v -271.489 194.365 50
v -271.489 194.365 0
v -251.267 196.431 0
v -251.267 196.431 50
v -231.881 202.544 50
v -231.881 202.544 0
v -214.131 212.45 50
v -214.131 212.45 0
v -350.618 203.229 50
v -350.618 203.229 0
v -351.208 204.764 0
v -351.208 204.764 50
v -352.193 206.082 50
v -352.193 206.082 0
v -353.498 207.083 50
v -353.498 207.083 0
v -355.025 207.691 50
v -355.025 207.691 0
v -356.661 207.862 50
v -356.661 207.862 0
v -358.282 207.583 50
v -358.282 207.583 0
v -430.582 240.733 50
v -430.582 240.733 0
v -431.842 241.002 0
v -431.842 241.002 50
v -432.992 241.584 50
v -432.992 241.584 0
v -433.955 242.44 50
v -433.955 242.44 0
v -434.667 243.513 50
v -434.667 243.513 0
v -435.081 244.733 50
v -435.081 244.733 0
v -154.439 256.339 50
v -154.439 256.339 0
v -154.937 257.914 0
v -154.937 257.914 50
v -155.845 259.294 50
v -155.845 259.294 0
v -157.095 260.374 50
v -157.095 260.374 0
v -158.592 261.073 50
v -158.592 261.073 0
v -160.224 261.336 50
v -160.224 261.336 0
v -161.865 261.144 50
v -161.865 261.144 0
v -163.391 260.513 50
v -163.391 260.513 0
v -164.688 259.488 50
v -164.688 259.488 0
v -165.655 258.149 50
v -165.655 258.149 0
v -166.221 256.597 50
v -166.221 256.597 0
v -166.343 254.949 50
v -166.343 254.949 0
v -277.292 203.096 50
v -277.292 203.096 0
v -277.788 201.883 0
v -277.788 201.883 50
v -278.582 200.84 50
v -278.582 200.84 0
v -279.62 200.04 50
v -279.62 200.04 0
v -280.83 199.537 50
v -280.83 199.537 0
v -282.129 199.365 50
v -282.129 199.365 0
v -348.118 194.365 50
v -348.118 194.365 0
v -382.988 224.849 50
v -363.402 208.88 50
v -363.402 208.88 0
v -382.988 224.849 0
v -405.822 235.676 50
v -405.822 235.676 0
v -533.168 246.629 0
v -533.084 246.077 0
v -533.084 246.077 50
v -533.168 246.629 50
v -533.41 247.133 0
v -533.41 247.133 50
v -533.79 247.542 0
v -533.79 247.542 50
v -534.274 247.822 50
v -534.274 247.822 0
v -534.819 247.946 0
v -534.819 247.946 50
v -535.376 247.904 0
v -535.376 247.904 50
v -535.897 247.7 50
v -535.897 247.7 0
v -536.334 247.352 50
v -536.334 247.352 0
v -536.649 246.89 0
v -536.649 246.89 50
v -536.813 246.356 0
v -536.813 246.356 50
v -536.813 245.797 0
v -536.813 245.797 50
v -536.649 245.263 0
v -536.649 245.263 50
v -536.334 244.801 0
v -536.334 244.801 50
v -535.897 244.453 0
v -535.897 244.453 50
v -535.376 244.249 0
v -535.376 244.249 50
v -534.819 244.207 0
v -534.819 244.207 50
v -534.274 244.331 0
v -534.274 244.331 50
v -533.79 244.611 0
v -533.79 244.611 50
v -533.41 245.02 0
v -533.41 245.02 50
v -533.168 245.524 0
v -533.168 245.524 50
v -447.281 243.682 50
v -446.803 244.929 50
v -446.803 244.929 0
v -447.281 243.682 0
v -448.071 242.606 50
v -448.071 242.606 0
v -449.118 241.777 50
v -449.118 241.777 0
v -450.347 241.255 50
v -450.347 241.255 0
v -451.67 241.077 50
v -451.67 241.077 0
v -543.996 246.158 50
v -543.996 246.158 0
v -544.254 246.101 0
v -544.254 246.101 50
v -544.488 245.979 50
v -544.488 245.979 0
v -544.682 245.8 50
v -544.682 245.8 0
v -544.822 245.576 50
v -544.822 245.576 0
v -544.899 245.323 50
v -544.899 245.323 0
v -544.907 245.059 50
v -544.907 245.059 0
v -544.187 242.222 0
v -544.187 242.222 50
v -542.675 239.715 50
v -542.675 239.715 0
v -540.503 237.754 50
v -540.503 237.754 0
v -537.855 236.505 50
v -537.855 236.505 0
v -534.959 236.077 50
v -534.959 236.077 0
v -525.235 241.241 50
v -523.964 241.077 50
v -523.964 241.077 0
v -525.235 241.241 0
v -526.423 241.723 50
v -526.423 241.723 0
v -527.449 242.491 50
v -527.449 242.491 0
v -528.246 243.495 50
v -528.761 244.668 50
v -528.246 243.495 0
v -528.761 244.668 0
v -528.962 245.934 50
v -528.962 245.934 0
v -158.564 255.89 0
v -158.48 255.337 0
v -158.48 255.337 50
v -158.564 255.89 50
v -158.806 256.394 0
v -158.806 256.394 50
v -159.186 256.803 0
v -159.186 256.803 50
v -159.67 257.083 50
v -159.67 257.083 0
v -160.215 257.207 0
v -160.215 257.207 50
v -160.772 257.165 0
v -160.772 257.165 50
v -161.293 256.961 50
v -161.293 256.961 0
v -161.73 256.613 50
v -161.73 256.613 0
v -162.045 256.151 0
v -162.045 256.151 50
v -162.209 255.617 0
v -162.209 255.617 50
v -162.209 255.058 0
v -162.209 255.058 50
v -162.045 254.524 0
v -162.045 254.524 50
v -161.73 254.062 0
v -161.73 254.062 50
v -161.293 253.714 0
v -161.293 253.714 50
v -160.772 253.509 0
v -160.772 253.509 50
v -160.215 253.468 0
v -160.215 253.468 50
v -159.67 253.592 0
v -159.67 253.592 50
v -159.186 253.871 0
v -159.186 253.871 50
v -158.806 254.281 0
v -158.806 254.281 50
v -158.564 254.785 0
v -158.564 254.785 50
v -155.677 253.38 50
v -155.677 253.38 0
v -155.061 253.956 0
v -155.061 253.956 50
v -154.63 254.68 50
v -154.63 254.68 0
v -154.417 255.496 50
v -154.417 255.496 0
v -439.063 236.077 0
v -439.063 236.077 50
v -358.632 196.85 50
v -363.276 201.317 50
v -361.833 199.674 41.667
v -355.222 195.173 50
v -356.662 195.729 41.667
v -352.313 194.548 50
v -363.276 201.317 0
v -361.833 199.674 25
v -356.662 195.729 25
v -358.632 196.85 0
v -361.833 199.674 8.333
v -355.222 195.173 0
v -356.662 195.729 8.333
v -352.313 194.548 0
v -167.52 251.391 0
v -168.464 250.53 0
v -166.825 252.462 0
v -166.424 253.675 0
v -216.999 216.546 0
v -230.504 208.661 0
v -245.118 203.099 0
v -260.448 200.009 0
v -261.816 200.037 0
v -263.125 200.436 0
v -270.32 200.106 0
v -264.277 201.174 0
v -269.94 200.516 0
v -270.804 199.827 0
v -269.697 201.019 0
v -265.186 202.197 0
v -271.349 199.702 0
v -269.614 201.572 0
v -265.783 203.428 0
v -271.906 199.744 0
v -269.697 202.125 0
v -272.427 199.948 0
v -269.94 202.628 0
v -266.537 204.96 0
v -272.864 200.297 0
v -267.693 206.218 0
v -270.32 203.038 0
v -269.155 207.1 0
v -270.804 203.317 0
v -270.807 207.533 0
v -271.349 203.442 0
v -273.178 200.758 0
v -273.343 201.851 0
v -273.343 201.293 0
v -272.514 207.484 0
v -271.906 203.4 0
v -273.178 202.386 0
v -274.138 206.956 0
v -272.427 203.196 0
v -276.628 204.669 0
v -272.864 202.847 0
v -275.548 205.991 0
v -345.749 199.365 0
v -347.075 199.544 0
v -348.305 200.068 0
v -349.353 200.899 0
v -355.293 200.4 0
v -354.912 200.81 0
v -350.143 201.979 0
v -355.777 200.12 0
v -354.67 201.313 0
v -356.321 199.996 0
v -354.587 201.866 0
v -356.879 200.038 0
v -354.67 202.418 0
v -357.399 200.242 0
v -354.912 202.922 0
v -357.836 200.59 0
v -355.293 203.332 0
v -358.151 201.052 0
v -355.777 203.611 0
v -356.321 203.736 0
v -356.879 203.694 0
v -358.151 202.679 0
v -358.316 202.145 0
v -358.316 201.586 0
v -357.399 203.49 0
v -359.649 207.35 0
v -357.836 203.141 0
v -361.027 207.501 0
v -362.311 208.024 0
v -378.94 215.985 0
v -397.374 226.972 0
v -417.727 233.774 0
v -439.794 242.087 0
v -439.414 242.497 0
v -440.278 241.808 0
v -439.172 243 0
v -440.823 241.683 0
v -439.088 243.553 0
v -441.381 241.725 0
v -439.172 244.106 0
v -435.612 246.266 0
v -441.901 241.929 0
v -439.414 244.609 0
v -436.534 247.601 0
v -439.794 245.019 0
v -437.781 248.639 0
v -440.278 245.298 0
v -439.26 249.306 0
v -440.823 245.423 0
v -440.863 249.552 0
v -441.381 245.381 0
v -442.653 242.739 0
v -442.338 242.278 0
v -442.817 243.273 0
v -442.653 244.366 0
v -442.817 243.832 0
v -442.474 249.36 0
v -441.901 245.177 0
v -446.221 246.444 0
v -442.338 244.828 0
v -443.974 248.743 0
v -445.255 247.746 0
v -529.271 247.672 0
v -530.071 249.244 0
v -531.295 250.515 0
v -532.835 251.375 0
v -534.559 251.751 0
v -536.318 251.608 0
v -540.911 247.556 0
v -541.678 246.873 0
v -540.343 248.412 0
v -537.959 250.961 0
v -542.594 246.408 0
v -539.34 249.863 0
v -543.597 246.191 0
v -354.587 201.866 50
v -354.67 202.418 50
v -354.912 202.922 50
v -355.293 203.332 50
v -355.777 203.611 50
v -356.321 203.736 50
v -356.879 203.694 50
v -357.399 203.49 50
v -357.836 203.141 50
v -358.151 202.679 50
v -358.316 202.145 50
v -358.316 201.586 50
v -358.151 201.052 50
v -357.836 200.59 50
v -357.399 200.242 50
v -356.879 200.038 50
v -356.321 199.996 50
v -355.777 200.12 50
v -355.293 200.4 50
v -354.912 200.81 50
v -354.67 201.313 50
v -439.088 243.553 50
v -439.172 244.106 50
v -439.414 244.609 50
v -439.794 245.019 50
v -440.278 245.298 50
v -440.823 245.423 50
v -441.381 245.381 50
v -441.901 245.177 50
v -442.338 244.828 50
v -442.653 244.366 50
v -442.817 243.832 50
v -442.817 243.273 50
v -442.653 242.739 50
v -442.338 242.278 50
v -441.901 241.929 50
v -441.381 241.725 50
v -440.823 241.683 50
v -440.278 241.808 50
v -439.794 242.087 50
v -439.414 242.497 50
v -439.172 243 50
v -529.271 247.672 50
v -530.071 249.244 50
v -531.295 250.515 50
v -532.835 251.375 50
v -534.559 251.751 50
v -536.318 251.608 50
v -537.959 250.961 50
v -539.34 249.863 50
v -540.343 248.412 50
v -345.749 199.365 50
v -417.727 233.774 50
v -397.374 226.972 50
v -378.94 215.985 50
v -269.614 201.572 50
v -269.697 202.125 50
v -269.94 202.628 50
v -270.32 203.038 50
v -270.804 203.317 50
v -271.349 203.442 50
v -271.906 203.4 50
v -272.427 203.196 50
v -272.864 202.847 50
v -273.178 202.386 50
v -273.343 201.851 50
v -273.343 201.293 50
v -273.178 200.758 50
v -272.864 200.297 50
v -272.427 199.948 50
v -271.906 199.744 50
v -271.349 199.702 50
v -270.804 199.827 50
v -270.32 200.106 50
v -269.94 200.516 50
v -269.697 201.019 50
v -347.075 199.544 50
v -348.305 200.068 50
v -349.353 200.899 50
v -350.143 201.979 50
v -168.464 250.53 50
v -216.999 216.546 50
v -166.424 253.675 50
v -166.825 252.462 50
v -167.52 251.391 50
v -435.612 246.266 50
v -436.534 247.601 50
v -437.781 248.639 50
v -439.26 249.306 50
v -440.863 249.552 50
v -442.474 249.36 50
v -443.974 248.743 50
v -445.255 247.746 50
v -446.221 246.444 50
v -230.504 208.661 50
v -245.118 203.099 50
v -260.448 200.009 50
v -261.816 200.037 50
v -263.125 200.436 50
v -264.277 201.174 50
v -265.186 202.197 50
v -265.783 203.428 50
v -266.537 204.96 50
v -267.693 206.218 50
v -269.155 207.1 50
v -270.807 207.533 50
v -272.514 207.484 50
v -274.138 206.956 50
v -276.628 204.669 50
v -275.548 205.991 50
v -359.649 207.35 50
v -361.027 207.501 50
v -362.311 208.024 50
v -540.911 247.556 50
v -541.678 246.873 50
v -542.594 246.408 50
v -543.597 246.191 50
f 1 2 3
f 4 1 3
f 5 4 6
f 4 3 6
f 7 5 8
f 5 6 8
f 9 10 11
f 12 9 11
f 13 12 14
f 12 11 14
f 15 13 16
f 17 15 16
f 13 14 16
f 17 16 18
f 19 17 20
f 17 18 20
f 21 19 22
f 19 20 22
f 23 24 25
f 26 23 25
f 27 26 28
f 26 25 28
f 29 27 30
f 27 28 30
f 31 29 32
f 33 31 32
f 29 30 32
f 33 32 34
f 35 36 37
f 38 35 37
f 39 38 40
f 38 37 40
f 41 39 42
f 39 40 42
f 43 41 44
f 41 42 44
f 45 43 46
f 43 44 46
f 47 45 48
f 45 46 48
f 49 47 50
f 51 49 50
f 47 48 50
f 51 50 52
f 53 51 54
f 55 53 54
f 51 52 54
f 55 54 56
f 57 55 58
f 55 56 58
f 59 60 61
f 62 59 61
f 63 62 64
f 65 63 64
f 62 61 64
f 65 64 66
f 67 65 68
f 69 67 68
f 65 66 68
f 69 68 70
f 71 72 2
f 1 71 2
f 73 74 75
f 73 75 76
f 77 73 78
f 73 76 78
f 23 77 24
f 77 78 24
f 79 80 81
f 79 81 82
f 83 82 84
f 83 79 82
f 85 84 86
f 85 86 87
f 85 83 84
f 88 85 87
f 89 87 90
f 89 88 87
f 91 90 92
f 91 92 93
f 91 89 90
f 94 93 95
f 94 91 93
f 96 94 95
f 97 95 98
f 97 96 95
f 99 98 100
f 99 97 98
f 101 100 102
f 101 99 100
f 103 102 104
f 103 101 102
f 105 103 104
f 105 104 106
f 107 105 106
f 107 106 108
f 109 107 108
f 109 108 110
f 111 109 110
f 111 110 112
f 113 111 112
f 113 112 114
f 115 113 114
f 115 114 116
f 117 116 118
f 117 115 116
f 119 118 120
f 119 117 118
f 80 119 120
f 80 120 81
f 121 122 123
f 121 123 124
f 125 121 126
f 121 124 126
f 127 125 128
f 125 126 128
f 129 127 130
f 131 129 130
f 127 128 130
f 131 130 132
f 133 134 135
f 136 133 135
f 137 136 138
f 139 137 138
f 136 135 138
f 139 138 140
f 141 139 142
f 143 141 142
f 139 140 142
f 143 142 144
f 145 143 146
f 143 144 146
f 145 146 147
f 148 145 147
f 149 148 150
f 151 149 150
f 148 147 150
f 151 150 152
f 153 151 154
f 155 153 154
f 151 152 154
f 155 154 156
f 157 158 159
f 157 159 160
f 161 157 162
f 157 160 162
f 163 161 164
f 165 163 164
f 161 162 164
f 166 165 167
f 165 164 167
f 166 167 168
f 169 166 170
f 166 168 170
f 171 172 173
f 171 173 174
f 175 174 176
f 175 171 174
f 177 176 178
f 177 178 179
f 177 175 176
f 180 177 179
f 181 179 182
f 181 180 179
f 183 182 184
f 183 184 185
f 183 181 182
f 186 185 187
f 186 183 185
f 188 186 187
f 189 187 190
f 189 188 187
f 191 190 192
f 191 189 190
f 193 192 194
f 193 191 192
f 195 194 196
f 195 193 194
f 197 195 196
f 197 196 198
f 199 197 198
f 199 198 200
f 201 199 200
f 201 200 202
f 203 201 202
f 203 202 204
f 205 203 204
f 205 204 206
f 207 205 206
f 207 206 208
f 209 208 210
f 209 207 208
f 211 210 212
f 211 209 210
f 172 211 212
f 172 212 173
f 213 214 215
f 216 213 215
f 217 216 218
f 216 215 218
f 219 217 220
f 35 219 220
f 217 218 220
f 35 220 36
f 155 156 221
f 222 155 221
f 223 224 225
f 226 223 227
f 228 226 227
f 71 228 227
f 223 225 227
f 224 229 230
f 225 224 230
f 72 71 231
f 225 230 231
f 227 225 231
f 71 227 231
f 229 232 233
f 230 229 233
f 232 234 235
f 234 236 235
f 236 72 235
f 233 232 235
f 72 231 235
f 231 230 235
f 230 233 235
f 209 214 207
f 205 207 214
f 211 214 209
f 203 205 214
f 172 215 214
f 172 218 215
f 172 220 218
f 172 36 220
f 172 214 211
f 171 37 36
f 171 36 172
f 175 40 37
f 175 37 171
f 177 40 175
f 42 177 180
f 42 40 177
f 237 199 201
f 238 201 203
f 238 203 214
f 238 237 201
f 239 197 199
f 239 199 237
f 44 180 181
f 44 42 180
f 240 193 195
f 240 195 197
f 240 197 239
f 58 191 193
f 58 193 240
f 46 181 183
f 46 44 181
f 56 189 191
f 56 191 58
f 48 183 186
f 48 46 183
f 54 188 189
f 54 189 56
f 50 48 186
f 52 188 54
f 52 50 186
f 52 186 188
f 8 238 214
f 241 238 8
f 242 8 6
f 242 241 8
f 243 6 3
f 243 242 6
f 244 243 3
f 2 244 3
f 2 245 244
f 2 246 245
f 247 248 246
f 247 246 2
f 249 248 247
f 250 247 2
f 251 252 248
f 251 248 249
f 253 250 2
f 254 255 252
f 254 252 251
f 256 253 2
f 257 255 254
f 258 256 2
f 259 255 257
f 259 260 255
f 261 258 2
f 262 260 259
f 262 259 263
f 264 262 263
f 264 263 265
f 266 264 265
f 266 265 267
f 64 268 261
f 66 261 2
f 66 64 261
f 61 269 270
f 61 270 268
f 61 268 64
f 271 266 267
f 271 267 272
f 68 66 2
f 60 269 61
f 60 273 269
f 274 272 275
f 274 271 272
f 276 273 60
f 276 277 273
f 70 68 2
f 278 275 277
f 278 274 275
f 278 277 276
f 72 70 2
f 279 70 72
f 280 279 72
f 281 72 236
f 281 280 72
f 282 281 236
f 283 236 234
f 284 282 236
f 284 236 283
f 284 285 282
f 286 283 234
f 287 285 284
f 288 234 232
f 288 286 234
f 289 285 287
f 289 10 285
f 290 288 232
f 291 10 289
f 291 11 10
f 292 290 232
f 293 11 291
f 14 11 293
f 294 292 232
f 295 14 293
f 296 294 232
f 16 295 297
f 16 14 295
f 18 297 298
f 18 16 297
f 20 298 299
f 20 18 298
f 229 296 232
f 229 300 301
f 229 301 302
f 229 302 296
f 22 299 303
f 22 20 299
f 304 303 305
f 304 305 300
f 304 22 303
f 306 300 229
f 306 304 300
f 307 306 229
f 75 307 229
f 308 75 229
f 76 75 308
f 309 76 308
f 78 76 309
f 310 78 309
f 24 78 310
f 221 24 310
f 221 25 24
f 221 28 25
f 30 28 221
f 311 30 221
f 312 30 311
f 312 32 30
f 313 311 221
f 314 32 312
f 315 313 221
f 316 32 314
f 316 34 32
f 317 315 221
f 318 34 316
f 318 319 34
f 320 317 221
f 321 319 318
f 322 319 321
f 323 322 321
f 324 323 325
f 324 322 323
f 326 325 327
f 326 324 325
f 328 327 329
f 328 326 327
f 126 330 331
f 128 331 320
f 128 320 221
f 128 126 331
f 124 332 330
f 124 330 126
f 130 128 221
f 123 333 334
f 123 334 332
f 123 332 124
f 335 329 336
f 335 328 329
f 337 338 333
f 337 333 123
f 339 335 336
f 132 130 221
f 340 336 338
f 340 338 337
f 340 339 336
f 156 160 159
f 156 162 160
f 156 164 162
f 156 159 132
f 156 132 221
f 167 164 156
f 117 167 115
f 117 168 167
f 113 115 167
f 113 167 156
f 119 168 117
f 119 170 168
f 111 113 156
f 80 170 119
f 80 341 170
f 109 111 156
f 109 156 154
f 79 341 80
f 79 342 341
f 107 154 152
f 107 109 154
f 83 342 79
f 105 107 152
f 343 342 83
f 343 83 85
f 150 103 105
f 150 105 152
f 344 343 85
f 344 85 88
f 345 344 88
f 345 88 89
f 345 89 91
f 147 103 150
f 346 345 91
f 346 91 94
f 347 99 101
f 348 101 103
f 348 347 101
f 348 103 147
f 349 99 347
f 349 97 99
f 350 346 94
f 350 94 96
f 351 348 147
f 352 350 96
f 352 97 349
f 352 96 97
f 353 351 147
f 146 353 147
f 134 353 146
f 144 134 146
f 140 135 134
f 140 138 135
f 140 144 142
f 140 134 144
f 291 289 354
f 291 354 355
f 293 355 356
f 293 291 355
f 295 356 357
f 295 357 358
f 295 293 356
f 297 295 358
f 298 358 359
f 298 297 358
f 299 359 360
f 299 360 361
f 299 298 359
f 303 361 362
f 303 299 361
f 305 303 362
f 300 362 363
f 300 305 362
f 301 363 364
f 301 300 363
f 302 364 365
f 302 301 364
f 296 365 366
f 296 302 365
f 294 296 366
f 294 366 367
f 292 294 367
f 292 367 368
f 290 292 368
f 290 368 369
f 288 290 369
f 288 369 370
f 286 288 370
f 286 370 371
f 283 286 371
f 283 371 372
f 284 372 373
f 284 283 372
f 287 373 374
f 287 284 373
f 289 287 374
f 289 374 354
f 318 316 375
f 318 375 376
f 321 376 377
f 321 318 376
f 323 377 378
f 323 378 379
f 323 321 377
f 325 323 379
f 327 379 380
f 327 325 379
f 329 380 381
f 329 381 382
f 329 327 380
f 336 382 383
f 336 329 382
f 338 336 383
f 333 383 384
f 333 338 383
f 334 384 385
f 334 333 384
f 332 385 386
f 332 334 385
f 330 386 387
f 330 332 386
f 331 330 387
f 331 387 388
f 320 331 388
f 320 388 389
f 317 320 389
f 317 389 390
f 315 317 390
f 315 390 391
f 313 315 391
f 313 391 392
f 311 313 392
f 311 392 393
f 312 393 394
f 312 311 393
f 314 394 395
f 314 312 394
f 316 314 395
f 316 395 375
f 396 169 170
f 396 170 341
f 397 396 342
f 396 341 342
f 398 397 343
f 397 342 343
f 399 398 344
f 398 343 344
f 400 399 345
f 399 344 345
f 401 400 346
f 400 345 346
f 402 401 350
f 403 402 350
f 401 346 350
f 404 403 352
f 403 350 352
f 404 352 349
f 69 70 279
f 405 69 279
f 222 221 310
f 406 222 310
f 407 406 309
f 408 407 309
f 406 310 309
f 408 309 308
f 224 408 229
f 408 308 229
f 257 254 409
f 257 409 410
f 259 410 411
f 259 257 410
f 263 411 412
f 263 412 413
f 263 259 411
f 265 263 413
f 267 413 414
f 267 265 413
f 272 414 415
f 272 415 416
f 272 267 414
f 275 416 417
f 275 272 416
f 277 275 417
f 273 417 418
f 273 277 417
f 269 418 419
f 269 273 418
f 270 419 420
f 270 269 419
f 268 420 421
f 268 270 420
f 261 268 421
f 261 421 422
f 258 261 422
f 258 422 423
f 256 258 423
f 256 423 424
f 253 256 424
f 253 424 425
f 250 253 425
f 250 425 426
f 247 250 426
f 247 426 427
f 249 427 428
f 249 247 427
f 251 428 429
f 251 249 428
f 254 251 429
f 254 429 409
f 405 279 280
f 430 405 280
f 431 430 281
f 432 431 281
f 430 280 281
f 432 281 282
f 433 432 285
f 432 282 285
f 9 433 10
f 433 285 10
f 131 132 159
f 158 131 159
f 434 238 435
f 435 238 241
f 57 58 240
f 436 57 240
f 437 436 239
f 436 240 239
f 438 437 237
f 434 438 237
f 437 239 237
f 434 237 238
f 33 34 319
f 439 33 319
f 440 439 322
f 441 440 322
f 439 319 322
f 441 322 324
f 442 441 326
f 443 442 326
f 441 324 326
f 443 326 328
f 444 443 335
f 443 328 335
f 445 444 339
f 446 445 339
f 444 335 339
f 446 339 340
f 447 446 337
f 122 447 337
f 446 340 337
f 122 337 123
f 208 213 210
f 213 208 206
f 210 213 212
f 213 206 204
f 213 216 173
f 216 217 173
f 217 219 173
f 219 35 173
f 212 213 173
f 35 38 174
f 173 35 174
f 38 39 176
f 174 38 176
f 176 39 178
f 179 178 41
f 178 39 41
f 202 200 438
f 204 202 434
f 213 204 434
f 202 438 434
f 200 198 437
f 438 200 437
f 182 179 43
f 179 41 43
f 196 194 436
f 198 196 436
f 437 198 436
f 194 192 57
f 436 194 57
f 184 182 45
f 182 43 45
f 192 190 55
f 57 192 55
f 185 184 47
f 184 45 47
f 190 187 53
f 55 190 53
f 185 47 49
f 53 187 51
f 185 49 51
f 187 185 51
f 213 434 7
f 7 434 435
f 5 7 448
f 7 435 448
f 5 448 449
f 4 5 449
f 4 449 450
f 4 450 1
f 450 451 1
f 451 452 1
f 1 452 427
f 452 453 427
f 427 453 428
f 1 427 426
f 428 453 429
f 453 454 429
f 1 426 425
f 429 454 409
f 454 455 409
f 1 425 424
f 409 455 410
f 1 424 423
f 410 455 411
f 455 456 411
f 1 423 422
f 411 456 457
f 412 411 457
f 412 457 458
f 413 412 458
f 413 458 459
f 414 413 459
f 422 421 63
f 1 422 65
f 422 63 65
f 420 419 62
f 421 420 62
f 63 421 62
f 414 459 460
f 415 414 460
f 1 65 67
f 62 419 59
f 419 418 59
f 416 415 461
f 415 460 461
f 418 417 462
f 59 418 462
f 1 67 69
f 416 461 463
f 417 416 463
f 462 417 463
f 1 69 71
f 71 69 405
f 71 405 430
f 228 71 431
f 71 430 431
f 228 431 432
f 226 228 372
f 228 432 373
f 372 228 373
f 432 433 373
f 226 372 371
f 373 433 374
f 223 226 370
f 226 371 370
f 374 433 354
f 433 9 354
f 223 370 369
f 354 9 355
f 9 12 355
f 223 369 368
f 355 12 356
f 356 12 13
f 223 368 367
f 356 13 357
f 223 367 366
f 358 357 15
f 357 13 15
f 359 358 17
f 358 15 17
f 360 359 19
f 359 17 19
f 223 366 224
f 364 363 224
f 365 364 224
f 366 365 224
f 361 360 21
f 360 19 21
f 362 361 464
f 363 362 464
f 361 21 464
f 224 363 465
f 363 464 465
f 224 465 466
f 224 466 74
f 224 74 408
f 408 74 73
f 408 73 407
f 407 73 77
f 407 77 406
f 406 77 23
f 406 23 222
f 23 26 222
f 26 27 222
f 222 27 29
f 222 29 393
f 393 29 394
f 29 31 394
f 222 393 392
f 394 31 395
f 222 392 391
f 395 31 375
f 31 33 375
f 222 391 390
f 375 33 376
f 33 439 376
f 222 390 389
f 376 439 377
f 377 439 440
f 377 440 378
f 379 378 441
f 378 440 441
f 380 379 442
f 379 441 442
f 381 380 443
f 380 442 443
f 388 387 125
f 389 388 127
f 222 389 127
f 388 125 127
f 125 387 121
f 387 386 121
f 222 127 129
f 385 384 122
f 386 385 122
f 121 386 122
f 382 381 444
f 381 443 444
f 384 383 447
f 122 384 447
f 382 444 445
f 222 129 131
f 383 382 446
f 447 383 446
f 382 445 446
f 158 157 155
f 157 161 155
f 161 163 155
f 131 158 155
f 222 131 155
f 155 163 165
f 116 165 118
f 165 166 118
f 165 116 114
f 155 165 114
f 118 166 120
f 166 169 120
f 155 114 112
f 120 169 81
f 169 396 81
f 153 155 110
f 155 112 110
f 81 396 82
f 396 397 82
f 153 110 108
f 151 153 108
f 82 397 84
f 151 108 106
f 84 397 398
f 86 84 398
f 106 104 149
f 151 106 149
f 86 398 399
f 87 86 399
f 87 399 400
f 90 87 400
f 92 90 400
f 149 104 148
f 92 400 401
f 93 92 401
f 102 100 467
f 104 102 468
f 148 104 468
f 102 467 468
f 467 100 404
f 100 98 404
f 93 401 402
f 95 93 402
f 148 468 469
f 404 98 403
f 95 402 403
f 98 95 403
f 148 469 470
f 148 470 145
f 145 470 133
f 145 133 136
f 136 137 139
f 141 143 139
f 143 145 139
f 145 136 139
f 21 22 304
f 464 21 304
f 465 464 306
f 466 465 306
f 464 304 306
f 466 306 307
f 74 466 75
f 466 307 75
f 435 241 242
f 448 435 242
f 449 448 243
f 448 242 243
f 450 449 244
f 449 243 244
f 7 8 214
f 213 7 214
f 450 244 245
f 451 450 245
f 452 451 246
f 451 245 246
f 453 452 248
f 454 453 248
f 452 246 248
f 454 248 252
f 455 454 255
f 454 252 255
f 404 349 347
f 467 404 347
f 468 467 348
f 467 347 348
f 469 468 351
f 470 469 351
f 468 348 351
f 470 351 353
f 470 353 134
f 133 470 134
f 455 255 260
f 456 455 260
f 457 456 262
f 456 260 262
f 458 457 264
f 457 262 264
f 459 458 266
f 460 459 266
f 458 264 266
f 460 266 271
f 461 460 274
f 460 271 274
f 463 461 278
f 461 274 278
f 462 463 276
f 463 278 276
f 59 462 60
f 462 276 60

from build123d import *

# Parameters (mm, degrees)
SKETCH1_R           = 1.8749999999999902
SKETCH1_R_2         = 1.8749999999999822
BOSS_EXTRUDE1_DEPTH = 50


with BuildPart() as part:
    # Sketch1 → Boss-Extrude1 (new body)
    # profile 1 of 3: a face of its own
    with BuildSketch(Plane.XY):
        with BuildLine():
            ThreePointArc((-544.9073445733862, 245.05934298496234), (-541.6610147269474, 238.65452406819674), (-534.9592100975257, 236.0765059267749))
            Line((-534.9592100975257, 236.07650592677487), (-441.5899759130262, 236.07650592677487))
            Line((-441.5899759130262, 236.07650592677484), (-439.06259783112466, 236.07650592677484))
            ThreePointArc((-439.06259783112466, 236.07650592677484), (-397.37358262088145, 226.97219345264216), (-363.27556383489673, 201.31702614277702))
            add(Edge.make_bspline(
                [(-383.12296849125244, 224.93458304595043), (-367.62274464990907, 206.36695430282649), (-363.27556383489645, 201.31702614277665)],
                knots=[-0.5220285895473142, -0.5220285895473142, -0.5220285895473142, 1.887e-14, 1.887e-14, 1.887e-14], degree=2))
            ThreePointArc((-383.1229684912514, 224.93458304595174), (-405.8980891559586, 235.70137914794805), (-430.5822522506289, 240.7334872459175))
            ThreePointArc((-430.5822522506289, 240.7334872459175), (-433.50085290752264, 241.98064646711703), (-435.0806969123075, 244.73341395420863))
            ThreePointArc((-435.08069691230753, 244.73341395420863), (-440.8631120126931, 249.55208851055136), (-446.8033920996223, 244.92942462898426))
            ThreePointArc((-446.8033920996222, 244.92942462898426), (-448.5664399466794, 242.15633970013647), (-451.6700341140156, 241.07650592677487))
            Line((-451.6700341140156, 241.07650592677487), (-523.9636485779045, 241.07650592677487))
            ThreePointArc((-523.9636485779045, 241.07650592677481), (-527.448607657875, 242.49111052167248), (-528.9616310868231, 245.93448184240285))
            ThreePointArc((-528.9616310868231, 245.93448184240285), (-533.6831252946306, 251.62678332689148), (-540.3433752762132, 248.41183792649997))
            ThreePointArc((-540.3433752762132, 248.41183792649997), (-541.6780229849218, 246.8731065868591), (-543.5973644050546, 246.19111893673872))
            Line((-543.5973644050546, 246.19111893673875), (-543.9963947067045, 246.15753652414114))
            ThreePointArc((-543.9963947067045, 246.15753652414116), (-544.6822020264595, 245.79950011796763), (-544.9073445733864, 245.05934298496234))
        make_face()
        with Locations((-534.9592100975258, 246.07650592677487)):
            Circle(SKETCH1_R, mode=Mode.SUBTRACT)
        with Locations((-440.9634216823502, 243.55292707163554)):
            Circle(SKETCH1_R, mode=Mode.SUBTRACT)
    # profile 2 of 3: a face of its own
    with BuildSketch(Plane.XY):
        with BuildLine():
            add(Edge.make_bspline(
                [(-383.12296849125244, 224.93458304595043), (-367.62274464990907, 206.36695430282649), (-363.27556383489645, 201.31702614277665)],
                knots=[-0.5220285895473142, -0.5220285895473142, -0.5220285895473142, 1.887e-14, 1.887e-14, 1.887e-14], degree=2))
            add(Edge.make_bspline(
                [(-363.2755638348965, 201.3170261427767), (-362.2346292716234, 200.10781838548988), (-361.83317155831753, 199.67366875065946), (-361.04162411691453, 198.81766319578747), (-360.27634316412167, 198.13844219041232), (-358.52376862577097, 196.58295405812672), (-356.6619331821235, 195.7294886371459), (-354.80036900749667, 194.8761475658919), (-352.4846532551344, 194.56947395223122), (-351.48825008923626, 194.4375188281029), (-350.30526494816087, 194.39325502601127), (-349.5536063403822, 194.3651301859774), (-348.11815703565105, 194.36513018597736)],
                knots=[1.893e-14, 1.893e-14, 1.893e-14, 0.125, 0.125, 0.25, 0.25, 0.5, 0.5, 0.75, 0.75, 0.875, 0.875, 1.0000000000000016, 1.0000000000000016, 1.0000000000000016], degree=2))
            add(Edge.make_bspline(
                [(-348.11815703565105, 194.36513018597736), (-333.4550041742609, 194.36513018597725), (-247.44050149953085, 197.29986636862012)],
                knots=[1.0000000000000016, 1.0000000000000016, 1.0000000000000016, 2.276878327665547, 2.276878327665547, 2.276878327665547], degree=2))
            ThreePointArc((-247.44050149953077, 197.29986636861926), (-230.0871000090499, 203.33834671649424), (-214.13144535031904, 212.4499257570787))
            Line((-214.13144535031904, 212.44992575707866), (-155.67654819642465, 253.3804853895092))
            ThreePointArc((-155.67654819642465, 253.3804853895092), (-154.62961317001395, 254.68034309191702), (-154.43933268041653, 256.3385036183176))
            ThreePointArc((-154.4393326804165, 256.3385036183176), (-161.0507101720321, 261.2969344989494), (-166.3426632069391, 254.94936943737002))
            ThreePointArc((-166.34266320693914, 254.94936943737002), (-166.8247741855496, 252.4619720660458), (-168.46431508885058, 250.5302675583712))
            Line((-168.46431508885058, 250.5302675583712), (-216.9993275320743, 216.5456859785236))
            ThreePointArc((-216.9993275320743, 216.5456859785236), (-237.69631255795534, 205.57859820435817), (-260.44760709280405, 200.00896622402453))
            ThreePointArc((-260.44760709280405, 200.0089662240245), (-263.72642255227106, 200.76527055587718), (-265.7834428399557, 203.42821903372513))
            ThreePointArc((-265.7834428399557, 203.42821903372513), (-271.6624634978908, 207.56948031752756), (-277.29243682695915, 203.0955190714807))
            ThreePointArc((-277.29243682695915, 203.0955190714807), (-279.07471454855846, 200.40608638901813), (-282.12856002823787, 199.36513018597742))
            Line((-282.12856002823787, 199.3651301859774), (-345.74927319295944, 199.3651301859774))
            ThreePointArc((-345.74927319295944, 199.36513018597742), (-348.8572930869804, 200.4484718732866), (-350.61849397452966, 203.22904525062938))
            ThreePointArc((-350.61849397452966, 203.22904525062938), (-353.49762862356397, 207.08255435055457), (-358.2818252430184, 207.58296559830646))
            ThreePointArc((-358.2818252430184, 207.5829655983065), (-361.0270213713086, 207.50053911285607), (-363.40161766909495, 208.88046241899406))
            ThreePointArc((-363.40161766909495, 208.88046241899406), (-372.7744857551701, 217.50675950249254), (-383.1229684912514, 224.93458304595174))
        make_face()
        with Locations((-356.46155891241386, 201.86574332821175)):
            Circle(SKETCH1_R, mode=Mode.SUBTRACT)
        with Locations((-271.4890889854247, 201.57198573408468)):
            Circle(SKETCH1_R, mode=Mode.SUBTRACT)
        with Locations((-160.35522233053905, 255.3373794264347)):
            Circle(SKETCH1_R_2, mode=Mode.SUBTRACT)
    # profile 3 of 3: a face of its own
    with BuildSketch(Plane.XY):
        with BuildLine():
            add(Edge.make_bspline(
                [(-348.11815703565105, 194.36513018597736), (-333.4550041742609, 194.36513018597725), (-247.44050149953085, 197.29986636862012)],
                knots=[1.0000000000000016, 1.0000000000000016, 1.0000000000000016, 2.276878327665547, 2.276878327665547, 2.276878327665547], degree=2))
            Line((-348.11815703565105, 194.3651301859774), (-271.4890889854247, 194.36513018597734))
            ThreePointArc((-271.4890889854247, 194.36513018597736), (-259.3755920034587, 195.10152562283494), (-247.44050149953077, 197.29986636861926))
        make_face()
    extrude(amount=BOSS_EXTRUDE1_DEPTH)


solid = part.part
